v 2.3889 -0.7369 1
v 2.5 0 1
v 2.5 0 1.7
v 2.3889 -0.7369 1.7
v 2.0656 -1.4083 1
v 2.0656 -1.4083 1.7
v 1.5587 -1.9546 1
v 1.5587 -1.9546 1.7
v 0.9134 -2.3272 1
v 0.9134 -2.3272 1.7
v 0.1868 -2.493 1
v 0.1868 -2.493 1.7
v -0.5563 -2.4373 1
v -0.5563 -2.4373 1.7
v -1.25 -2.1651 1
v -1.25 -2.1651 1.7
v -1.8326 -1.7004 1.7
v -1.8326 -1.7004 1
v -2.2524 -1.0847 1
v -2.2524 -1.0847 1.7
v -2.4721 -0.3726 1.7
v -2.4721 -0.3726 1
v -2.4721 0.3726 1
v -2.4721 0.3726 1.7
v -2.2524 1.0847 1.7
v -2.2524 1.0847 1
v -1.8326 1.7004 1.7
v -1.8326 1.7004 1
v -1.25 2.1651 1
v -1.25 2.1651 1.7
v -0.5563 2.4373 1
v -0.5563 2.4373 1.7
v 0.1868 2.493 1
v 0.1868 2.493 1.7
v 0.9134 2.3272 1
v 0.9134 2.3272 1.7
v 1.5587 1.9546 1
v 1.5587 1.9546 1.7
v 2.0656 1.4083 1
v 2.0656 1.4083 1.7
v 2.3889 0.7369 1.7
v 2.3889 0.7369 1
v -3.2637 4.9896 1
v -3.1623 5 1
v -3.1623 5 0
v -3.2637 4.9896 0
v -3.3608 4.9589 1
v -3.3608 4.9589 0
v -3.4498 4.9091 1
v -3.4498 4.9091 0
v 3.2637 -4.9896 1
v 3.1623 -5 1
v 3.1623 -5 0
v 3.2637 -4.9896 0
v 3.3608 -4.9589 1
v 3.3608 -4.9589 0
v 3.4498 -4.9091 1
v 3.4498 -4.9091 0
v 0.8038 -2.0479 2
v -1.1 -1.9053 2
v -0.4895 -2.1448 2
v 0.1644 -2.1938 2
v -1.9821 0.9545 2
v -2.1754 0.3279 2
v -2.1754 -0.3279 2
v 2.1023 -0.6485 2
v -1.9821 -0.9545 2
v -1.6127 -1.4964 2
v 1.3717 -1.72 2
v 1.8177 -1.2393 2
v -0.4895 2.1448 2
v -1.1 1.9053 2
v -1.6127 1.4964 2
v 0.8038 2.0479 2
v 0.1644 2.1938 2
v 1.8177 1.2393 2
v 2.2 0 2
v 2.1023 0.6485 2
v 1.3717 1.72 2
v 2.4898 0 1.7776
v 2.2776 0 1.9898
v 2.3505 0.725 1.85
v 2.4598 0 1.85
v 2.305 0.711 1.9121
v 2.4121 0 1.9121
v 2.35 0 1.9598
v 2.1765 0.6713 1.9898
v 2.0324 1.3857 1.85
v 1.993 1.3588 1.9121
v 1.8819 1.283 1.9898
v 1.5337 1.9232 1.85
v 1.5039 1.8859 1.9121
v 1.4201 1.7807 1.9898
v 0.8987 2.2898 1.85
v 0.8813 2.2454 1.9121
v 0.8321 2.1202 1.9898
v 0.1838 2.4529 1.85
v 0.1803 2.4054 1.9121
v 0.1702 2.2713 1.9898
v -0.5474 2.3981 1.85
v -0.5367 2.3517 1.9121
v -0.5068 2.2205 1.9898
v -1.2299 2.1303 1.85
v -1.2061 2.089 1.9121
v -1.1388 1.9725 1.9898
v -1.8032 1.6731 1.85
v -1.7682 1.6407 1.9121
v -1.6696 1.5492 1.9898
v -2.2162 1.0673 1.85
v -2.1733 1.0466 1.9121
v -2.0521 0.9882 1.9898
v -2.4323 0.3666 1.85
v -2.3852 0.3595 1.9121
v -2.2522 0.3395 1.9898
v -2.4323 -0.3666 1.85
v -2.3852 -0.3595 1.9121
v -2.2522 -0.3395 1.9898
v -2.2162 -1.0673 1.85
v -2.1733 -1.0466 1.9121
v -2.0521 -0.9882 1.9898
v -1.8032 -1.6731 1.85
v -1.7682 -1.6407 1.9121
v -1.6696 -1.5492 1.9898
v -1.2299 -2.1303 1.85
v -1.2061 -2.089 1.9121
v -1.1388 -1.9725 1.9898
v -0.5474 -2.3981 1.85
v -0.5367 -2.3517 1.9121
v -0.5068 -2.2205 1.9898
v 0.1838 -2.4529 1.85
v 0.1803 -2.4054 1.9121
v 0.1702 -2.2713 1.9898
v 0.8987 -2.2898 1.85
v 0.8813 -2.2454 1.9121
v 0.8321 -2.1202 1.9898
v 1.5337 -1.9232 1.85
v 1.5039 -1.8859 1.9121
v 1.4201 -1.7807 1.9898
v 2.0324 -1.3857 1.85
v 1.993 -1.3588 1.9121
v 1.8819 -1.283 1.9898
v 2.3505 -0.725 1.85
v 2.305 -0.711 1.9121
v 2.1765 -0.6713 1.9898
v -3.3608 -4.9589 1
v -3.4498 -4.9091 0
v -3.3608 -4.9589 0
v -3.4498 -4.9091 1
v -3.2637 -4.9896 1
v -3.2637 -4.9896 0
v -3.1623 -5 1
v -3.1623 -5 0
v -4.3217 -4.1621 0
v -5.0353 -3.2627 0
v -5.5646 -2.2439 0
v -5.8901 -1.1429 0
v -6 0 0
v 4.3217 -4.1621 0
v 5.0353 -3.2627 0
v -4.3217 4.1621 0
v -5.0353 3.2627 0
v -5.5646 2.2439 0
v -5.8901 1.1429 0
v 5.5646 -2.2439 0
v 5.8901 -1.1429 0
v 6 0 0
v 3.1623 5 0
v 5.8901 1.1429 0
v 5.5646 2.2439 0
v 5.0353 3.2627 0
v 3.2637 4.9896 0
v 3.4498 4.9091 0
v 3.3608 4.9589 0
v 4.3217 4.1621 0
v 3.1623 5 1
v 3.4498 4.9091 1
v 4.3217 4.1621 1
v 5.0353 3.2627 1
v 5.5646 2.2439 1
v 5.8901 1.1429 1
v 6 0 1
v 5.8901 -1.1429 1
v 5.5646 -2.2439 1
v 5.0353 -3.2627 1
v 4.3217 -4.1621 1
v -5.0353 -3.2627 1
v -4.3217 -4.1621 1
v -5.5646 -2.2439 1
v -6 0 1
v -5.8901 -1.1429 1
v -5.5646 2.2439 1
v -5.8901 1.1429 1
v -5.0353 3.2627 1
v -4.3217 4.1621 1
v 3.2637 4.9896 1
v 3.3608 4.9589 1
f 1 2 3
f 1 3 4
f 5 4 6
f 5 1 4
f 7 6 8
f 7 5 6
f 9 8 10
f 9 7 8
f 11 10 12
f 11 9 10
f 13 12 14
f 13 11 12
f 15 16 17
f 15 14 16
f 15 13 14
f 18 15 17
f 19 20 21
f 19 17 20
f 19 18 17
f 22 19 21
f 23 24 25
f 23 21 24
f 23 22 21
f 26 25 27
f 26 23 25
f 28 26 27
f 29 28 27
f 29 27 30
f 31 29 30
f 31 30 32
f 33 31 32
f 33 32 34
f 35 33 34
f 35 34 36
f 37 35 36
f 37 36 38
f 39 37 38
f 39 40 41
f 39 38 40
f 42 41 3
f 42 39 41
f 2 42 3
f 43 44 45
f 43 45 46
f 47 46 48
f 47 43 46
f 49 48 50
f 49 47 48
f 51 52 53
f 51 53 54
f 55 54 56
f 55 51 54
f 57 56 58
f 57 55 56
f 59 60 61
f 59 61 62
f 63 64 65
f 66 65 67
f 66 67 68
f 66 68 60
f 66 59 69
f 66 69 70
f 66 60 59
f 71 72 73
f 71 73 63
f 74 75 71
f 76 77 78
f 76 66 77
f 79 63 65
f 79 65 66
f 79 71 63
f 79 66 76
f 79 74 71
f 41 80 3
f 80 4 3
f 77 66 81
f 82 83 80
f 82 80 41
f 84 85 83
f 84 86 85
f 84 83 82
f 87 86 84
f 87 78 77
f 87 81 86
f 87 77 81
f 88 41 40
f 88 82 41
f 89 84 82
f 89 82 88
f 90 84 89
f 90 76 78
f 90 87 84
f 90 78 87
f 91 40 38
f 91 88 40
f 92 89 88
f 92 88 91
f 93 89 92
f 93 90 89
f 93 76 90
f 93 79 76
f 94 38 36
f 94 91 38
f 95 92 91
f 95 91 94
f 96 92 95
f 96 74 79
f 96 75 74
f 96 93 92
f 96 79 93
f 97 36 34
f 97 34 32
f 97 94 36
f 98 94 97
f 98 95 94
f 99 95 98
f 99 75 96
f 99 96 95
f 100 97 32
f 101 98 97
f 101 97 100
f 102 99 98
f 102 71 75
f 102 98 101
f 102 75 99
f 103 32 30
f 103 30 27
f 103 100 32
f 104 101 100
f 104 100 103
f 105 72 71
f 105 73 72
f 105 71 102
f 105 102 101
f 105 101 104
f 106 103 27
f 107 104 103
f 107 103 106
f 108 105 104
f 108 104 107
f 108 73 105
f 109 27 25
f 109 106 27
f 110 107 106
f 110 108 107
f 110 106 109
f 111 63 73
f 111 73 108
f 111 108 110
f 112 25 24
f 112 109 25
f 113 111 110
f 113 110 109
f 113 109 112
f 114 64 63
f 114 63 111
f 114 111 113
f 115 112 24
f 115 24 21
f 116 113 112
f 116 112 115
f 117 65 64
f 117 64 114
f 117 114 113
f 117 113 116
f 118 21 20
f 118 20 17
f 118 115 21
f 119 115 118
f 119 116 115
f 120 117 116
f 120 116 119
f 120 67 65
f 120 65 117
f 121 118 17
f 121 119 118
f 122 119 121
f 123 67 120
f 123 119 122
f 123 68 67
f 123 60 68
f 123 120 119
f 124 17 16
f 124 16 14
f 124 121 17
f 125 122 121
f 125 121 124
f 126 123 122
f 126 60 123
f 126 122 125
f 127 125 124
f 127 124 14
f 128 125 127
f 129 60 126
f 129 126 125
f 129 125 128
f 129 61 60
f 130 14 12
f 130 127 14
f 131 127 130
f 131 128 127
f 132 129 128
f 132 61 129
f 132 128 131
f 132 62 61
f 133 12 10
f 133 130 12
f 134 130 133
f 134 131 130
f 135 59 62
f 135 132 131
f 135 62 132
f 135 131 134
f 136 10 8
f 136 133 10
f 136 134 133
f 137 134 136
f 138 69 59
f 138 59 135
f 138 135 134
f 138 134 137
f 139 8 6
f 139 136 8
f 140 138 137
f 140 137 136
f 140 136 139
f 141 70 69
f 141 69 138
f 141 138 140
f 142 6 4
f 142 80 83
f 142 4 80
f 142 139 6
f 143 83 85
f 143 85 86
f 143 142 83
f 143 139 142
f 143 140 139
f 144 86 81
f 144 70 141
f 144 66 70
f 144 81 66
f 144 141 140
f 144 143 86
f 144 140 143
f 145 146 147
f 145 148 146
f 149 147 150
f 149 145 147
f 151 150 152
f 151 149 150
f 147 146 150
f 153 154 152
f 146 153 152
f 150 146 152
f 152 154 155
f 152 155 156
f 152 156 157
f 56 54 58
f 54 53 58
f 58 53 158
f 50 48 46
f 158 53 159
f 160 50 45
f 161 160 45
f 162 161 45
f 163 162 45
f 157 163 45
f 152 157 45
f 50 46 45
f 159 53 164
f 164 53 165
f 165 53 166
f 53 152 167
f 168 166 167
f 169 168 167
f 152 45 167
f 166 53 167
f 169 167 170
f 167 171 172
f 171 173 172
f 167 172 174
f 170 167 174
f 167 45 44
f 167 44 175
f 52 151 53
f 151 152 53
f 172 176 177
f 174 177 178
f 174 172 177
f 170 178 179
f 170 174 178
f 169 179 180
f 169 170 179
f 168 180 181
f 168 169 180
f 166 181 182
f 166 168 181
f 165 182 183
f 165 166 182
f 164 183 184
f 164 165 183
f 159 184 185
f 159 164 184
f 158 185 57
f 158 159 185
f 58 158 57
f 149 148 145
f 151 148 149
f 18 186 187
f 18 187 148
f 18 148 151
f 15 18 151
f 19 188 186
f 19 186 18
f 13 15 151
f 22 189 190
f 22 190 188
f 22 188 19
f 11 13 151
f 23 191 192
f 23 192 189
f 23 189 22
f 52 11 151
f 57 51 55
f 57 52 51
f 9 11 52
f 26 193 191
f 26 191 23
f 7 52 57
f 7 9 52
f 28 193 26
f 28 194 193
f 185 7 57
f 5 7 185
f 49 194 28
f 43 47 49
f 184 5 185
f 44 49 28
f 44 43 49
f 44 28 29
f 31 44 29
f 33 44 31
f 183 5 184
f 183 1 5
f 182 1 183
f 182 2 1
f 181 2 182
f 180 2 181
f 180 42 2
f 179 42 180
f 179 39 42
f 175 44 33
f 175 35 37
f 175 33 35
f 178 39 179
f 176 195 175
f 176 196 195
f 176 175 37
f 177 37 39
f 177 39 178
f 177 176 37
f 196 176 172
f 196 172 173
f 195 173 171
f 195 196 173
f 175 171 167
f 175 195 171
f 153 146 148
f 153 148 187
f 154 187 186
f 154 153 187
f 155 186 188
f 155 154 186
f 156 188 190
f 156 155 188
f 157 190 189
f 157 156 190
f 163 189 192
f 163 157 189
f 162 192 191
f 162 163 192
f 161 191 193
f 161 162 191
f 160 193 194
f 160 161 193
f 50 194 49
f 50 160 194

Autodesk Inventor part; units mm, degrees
ref_plane "YZ Plane" through (0, 0, 0) normal (1, 0, 0) x (0, 1, 0)
ref_plane "XZ Plane" through (0, 0, 0) normal (0, 1, 0) x (-1, 0, 0)
ref_plane "XY Plane" through (0, 0, 0) normal (0, 0, 1) x (1, 0, 0)
sketch "Esquisse1" plane through (0, 0, 0) normal (0, 0, 1) x (1, 0, 0)
  circle A0 centre (0, 0) radius 6
  line L0 (-3.3166, 5) -> (3.3166, 5)
  line L1 (-3.3166, -5) -> (3.3166, -5)
  dimension "d0" = 12
  dimension "d1" = 10
  dimension "d2" = 5
extrude "Extrusion1" add sketch "Esquisse1" along normal blind 1 contours A0 L1 L0
fillet "Congé1" radius 0.5 4 edges at (-3.3166, 5, 0.5) (3.3166, 5, 0.5) (-3.3166, -5, 0.5) (3.3166, -5, 0.5)
sketch "Esquisse2" plane through (0, 0, 1) normal (0, 0, 1) x (1, 0, 0)
  arc A0 (-3.4498, 4.9091) -> (-3.4498, -4.9091) centre (0, 0) ccw projected
  circle A1 centre (0, 0) radius 2.5
  dimension "d6" = 5
extrude "Extrusion2" add sketch "Esquisse2" along normal blind 1
fillet "Congé2" radius 0.3 1 edges at (-2.5, 0, 2)
equation "\"d2\" = 0.5 * d1"
properties part number "plaque moteur" material "Résine acétal, noir"
